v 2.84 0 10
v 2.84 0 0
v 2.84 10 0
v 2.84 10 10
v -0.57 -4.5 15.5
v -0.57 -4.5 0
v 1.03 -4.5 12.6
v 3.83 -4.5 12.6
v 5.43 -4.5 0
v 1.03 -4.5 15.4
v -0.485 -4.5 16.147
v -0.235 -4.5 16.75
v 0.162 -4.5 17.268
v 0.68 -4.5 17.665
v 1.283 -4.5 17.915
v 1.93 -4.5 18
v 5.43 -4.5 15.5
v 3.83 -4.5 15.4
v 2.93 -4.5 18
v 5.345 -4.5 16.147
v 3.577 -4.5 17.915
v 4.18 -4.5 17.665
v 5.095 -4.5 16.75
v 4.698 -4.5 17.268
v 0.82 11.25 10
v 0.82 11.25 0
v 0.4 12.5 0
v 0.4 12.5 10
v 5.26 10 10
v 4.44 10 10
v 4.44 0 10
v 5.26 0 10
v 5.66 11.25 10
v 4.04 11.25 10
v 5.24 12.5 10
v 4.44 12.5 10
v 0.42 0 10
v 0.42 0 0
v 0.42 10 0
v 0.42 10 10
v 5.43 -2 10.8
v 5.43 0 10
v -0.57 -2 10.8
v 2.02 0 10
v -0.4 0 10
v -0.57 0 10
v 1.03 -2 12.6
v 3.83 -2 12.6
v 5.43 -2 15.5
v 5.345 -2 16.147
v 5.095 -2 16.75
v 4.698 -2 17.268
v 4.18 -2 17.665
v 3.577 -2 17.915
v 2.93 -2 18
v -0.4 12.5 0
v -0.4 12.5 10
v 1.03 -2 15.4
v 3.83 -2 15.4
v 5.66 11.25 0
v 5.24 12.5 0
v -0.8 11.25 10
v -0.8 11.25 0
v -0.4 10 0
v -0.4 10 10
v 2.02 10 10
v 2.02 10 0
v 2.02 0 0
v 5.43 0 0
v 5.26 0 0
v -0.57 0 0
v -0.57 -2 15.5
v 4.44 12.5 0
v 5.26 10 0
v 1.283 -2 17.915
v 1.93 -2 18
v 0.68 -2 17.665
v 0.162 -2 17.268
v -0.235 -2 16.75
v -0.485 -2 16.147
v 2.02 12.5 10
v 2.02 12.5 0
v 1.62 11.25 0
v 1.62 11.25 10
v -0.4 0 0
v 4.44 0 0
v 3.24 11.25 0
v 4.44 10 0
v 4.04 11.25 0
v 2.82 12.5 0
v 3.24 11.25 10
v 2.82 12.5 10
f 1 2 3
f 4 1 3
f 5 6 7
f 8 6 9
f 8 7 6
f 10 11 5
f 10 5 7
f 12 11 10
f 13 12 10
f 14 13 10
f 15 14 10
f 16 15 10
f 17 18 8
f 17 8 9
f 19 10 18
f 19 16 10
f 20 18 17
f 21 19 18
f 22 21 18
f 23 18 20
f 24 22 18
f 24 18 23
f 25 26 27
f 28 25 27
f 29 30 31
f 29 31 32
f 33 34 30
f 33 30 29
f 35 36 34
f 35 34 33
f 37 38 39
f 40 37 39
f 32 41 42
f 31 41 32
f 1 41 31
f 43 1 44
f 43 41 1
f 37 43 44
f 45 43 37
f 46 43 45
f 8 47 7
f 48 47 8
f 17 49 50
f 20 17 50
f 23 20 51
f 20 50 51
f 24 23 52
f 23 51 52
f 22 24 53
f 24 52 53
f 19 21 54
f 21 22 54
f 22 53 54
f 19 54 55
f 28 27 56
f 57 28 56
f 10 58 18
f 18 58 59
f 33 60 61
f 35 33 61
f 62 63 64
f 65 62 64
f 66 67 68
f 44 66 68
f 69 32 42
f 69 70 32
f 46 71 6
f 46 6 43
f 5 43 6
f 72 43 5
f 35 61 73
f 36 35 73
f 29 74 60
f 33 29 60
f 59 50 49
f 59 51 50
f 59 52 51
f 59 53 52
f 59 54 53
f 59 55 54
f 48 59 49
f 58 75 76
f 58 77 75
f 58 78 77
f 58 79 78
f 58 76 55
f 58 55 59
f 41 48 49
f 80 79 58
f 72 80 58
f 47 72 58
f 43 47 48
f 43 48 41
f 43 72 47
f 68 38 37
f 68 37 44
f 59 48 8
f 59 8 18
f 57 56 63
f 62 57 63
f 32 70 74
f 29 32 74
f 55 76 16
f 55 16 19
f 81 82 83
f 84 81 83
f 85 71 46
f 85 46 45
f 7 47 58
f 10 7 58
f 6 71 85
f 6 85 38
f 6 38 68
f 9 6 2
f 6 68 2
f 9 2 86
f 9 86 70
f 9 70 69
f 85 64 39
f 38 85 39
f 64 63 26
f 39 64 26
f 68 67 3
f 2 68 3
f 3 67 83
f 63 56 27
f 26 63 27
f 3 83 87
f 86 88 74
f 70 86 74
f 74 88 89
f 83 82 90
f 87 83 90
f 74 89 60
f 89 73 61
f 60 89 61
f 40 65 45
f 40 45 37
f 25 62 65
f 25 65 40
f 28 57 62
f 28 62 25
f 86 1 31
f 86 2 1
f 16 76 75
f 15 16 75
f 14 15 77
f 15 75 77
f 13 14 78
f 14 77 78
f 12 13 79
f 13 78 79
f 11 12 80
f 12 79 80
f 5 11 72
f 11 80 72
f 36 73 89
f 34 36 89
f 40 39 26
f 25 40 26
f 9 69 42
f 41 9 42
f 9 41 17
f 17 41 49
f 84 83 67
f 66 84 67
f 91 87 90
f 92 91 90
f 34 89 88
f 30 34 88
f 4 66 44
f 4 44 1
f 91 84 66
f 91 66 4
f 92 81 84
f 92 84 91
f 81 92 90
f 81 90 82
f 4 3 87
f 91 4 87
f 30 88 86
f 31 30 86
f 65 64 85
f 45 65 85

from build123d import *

# Parameters (mm, degrees)
RESSALTO_EXTRUS_O1_DEPTH   = 10
ESBO_O2_W                  = 6
ESBO_O2_H                  = 2.5
RESSALTO_EXTRUS_O2_DEPTH   = 8
ESBO_O3_W                  = 2.8
ESBO_O3_H                  = 2.8
CORTE_EXTRUS_O1_DEPTH      = 25.104680044
ESBO_O4_W                  = 6
ESBO_O4_H                  = 18
ESBO_O4_W_2                = 2.8
ESBO_O4_H_2                = 2.8
RESSALTO_EXTRUS_O3_DEPTH   = 2
CORTE_EXTRUS_O3_DEPTH      = 23.633727046
CORTE_EXTRUS_O3_DEPTH_BACK = 23.633727046
CORTE_EXTRUS_O4_DEPTH      = 24.796756081


with BuildPart() as part:
    # Esboço1 → Ressalto-extrusão1 (new body)
    with BuildSketch(Plane.XY):
        Polygon((-0.4, 0), (-0.57, 0), (-0.57, -2.5), (5.43, -2.5), (5.43, 0), (5.26, 0), (5.26, 10), (5.66, 11.25), (5.24, 12.5), (4.44, 12.5), (4.04, 11.25), (4.44, 10), (4.44, 0), (2.84, 0), (2.84, 10), (3.24, 11.25), (2.82, 12.5), (2.02, 12.5), (1.62, 11.25), (2.02, 10), (2.02, 0), (0.42, 0), (0.42, 10), (0.82, 11.25), (0.4, 12.5), (-0.4, 12.5), (-0.8, 11.25), (-0.4, 10), align=None)
    extrude(amount=RESSALTO_EXTRUS_O1_DEPTH)

    # Esboço2 → Ressalto-extrusão2 (add)
    with BuildSketch(Plane.XY.offset(10)):
        with Locations((2.43, -1.25)):
            Rectangle(ESBO_O2_W, ESBO_O2_H)
    extrude(amount=RESSALTO_EXTRUS_O2_DEPTH)

    # Esboço3 → Corte-extrusão1 (cut, through all)
    with BuildSketch(Plane.XZ.offset(2.5)):
        with Locations((2.43, 14)):
            Rectangle(ESBO_O3_W, ESBO_O3_H)
    extrude(amount=-CORTE_EXTRUS_O1_DEPTH, mode=Mode.SUBTRACT)

    # Esboço4 → Ressalto-extrusão3 (add)
    with BuildSketch(Plane.XZ.offset(2.5)):
        with Locations((2.43, 9)):
            Rectangle(ESBO_O4_W, ESBO_O4_H)
        with Locations((2.43, 14)):
            Rectangle(ESBO_O4_W_2, ESBO_O4_H_2, mode=Mode.SUBTRACT)
    extrude(amount=RESSALTO_EXTRUS_O3_DEPTH)

    # Esboço6 → Corte-extrusão3 (cut, two sides: drawn at the far end of the back side and taken through both)
    with BuildSketch(Plane(origin=(0, 0, 0), x_dir=(0, 0, -1), z_dir=(1, 0, 0)).offset(-CORTE_EXTRUS_O3_DEPTH_BACK)):
        Polygon((-18, 0), (-18, -2), (-14, -2), (-10.8, -2), (-10, 0), align=None)
    extrude(amount=CORTE_EXTRUS_O3_DEPTH + CORTE_EXTRUS_O3_DEPTH_BACK, mode=Mode.SUBTRACT)

    # Esboço7 → Corte-extrusão4 (cut, through all)
    with BuildSketch(Plane(origin=(0, -2, 0), x_dir=(1, 0, 0), z_dir=(0, 1, 0))):
        with BuildLine():
            Line((-0.57, -15.5), (-3.321312229, -15.5))
            Line((-3.321312229, -15.5), (-3.321312229, -18.857639181))
            Line((-3.321312229, -18.857639181), (8.546861735, -18.857639181))
            Line((8.546861735, -18.857639181), (8.546861735, -15.5))
            Line((8.546861735, -15.5), (5.43, -15.5))
            ThreePointArc((5.43, -15.5), (4.697766953, -17.267766953), (2.93, -18))
            Line((2.93, -18), (1.93, -18))
            ThreePointArc((1.93, -18), (0.162233047, -17.267766953), (-0.57, -15.5))
        make_face()
    extrude(amount=-CORTE_EXTRUS_O4_DEPTH, mode=Mode.SUBTRACT)


solid = part.part
